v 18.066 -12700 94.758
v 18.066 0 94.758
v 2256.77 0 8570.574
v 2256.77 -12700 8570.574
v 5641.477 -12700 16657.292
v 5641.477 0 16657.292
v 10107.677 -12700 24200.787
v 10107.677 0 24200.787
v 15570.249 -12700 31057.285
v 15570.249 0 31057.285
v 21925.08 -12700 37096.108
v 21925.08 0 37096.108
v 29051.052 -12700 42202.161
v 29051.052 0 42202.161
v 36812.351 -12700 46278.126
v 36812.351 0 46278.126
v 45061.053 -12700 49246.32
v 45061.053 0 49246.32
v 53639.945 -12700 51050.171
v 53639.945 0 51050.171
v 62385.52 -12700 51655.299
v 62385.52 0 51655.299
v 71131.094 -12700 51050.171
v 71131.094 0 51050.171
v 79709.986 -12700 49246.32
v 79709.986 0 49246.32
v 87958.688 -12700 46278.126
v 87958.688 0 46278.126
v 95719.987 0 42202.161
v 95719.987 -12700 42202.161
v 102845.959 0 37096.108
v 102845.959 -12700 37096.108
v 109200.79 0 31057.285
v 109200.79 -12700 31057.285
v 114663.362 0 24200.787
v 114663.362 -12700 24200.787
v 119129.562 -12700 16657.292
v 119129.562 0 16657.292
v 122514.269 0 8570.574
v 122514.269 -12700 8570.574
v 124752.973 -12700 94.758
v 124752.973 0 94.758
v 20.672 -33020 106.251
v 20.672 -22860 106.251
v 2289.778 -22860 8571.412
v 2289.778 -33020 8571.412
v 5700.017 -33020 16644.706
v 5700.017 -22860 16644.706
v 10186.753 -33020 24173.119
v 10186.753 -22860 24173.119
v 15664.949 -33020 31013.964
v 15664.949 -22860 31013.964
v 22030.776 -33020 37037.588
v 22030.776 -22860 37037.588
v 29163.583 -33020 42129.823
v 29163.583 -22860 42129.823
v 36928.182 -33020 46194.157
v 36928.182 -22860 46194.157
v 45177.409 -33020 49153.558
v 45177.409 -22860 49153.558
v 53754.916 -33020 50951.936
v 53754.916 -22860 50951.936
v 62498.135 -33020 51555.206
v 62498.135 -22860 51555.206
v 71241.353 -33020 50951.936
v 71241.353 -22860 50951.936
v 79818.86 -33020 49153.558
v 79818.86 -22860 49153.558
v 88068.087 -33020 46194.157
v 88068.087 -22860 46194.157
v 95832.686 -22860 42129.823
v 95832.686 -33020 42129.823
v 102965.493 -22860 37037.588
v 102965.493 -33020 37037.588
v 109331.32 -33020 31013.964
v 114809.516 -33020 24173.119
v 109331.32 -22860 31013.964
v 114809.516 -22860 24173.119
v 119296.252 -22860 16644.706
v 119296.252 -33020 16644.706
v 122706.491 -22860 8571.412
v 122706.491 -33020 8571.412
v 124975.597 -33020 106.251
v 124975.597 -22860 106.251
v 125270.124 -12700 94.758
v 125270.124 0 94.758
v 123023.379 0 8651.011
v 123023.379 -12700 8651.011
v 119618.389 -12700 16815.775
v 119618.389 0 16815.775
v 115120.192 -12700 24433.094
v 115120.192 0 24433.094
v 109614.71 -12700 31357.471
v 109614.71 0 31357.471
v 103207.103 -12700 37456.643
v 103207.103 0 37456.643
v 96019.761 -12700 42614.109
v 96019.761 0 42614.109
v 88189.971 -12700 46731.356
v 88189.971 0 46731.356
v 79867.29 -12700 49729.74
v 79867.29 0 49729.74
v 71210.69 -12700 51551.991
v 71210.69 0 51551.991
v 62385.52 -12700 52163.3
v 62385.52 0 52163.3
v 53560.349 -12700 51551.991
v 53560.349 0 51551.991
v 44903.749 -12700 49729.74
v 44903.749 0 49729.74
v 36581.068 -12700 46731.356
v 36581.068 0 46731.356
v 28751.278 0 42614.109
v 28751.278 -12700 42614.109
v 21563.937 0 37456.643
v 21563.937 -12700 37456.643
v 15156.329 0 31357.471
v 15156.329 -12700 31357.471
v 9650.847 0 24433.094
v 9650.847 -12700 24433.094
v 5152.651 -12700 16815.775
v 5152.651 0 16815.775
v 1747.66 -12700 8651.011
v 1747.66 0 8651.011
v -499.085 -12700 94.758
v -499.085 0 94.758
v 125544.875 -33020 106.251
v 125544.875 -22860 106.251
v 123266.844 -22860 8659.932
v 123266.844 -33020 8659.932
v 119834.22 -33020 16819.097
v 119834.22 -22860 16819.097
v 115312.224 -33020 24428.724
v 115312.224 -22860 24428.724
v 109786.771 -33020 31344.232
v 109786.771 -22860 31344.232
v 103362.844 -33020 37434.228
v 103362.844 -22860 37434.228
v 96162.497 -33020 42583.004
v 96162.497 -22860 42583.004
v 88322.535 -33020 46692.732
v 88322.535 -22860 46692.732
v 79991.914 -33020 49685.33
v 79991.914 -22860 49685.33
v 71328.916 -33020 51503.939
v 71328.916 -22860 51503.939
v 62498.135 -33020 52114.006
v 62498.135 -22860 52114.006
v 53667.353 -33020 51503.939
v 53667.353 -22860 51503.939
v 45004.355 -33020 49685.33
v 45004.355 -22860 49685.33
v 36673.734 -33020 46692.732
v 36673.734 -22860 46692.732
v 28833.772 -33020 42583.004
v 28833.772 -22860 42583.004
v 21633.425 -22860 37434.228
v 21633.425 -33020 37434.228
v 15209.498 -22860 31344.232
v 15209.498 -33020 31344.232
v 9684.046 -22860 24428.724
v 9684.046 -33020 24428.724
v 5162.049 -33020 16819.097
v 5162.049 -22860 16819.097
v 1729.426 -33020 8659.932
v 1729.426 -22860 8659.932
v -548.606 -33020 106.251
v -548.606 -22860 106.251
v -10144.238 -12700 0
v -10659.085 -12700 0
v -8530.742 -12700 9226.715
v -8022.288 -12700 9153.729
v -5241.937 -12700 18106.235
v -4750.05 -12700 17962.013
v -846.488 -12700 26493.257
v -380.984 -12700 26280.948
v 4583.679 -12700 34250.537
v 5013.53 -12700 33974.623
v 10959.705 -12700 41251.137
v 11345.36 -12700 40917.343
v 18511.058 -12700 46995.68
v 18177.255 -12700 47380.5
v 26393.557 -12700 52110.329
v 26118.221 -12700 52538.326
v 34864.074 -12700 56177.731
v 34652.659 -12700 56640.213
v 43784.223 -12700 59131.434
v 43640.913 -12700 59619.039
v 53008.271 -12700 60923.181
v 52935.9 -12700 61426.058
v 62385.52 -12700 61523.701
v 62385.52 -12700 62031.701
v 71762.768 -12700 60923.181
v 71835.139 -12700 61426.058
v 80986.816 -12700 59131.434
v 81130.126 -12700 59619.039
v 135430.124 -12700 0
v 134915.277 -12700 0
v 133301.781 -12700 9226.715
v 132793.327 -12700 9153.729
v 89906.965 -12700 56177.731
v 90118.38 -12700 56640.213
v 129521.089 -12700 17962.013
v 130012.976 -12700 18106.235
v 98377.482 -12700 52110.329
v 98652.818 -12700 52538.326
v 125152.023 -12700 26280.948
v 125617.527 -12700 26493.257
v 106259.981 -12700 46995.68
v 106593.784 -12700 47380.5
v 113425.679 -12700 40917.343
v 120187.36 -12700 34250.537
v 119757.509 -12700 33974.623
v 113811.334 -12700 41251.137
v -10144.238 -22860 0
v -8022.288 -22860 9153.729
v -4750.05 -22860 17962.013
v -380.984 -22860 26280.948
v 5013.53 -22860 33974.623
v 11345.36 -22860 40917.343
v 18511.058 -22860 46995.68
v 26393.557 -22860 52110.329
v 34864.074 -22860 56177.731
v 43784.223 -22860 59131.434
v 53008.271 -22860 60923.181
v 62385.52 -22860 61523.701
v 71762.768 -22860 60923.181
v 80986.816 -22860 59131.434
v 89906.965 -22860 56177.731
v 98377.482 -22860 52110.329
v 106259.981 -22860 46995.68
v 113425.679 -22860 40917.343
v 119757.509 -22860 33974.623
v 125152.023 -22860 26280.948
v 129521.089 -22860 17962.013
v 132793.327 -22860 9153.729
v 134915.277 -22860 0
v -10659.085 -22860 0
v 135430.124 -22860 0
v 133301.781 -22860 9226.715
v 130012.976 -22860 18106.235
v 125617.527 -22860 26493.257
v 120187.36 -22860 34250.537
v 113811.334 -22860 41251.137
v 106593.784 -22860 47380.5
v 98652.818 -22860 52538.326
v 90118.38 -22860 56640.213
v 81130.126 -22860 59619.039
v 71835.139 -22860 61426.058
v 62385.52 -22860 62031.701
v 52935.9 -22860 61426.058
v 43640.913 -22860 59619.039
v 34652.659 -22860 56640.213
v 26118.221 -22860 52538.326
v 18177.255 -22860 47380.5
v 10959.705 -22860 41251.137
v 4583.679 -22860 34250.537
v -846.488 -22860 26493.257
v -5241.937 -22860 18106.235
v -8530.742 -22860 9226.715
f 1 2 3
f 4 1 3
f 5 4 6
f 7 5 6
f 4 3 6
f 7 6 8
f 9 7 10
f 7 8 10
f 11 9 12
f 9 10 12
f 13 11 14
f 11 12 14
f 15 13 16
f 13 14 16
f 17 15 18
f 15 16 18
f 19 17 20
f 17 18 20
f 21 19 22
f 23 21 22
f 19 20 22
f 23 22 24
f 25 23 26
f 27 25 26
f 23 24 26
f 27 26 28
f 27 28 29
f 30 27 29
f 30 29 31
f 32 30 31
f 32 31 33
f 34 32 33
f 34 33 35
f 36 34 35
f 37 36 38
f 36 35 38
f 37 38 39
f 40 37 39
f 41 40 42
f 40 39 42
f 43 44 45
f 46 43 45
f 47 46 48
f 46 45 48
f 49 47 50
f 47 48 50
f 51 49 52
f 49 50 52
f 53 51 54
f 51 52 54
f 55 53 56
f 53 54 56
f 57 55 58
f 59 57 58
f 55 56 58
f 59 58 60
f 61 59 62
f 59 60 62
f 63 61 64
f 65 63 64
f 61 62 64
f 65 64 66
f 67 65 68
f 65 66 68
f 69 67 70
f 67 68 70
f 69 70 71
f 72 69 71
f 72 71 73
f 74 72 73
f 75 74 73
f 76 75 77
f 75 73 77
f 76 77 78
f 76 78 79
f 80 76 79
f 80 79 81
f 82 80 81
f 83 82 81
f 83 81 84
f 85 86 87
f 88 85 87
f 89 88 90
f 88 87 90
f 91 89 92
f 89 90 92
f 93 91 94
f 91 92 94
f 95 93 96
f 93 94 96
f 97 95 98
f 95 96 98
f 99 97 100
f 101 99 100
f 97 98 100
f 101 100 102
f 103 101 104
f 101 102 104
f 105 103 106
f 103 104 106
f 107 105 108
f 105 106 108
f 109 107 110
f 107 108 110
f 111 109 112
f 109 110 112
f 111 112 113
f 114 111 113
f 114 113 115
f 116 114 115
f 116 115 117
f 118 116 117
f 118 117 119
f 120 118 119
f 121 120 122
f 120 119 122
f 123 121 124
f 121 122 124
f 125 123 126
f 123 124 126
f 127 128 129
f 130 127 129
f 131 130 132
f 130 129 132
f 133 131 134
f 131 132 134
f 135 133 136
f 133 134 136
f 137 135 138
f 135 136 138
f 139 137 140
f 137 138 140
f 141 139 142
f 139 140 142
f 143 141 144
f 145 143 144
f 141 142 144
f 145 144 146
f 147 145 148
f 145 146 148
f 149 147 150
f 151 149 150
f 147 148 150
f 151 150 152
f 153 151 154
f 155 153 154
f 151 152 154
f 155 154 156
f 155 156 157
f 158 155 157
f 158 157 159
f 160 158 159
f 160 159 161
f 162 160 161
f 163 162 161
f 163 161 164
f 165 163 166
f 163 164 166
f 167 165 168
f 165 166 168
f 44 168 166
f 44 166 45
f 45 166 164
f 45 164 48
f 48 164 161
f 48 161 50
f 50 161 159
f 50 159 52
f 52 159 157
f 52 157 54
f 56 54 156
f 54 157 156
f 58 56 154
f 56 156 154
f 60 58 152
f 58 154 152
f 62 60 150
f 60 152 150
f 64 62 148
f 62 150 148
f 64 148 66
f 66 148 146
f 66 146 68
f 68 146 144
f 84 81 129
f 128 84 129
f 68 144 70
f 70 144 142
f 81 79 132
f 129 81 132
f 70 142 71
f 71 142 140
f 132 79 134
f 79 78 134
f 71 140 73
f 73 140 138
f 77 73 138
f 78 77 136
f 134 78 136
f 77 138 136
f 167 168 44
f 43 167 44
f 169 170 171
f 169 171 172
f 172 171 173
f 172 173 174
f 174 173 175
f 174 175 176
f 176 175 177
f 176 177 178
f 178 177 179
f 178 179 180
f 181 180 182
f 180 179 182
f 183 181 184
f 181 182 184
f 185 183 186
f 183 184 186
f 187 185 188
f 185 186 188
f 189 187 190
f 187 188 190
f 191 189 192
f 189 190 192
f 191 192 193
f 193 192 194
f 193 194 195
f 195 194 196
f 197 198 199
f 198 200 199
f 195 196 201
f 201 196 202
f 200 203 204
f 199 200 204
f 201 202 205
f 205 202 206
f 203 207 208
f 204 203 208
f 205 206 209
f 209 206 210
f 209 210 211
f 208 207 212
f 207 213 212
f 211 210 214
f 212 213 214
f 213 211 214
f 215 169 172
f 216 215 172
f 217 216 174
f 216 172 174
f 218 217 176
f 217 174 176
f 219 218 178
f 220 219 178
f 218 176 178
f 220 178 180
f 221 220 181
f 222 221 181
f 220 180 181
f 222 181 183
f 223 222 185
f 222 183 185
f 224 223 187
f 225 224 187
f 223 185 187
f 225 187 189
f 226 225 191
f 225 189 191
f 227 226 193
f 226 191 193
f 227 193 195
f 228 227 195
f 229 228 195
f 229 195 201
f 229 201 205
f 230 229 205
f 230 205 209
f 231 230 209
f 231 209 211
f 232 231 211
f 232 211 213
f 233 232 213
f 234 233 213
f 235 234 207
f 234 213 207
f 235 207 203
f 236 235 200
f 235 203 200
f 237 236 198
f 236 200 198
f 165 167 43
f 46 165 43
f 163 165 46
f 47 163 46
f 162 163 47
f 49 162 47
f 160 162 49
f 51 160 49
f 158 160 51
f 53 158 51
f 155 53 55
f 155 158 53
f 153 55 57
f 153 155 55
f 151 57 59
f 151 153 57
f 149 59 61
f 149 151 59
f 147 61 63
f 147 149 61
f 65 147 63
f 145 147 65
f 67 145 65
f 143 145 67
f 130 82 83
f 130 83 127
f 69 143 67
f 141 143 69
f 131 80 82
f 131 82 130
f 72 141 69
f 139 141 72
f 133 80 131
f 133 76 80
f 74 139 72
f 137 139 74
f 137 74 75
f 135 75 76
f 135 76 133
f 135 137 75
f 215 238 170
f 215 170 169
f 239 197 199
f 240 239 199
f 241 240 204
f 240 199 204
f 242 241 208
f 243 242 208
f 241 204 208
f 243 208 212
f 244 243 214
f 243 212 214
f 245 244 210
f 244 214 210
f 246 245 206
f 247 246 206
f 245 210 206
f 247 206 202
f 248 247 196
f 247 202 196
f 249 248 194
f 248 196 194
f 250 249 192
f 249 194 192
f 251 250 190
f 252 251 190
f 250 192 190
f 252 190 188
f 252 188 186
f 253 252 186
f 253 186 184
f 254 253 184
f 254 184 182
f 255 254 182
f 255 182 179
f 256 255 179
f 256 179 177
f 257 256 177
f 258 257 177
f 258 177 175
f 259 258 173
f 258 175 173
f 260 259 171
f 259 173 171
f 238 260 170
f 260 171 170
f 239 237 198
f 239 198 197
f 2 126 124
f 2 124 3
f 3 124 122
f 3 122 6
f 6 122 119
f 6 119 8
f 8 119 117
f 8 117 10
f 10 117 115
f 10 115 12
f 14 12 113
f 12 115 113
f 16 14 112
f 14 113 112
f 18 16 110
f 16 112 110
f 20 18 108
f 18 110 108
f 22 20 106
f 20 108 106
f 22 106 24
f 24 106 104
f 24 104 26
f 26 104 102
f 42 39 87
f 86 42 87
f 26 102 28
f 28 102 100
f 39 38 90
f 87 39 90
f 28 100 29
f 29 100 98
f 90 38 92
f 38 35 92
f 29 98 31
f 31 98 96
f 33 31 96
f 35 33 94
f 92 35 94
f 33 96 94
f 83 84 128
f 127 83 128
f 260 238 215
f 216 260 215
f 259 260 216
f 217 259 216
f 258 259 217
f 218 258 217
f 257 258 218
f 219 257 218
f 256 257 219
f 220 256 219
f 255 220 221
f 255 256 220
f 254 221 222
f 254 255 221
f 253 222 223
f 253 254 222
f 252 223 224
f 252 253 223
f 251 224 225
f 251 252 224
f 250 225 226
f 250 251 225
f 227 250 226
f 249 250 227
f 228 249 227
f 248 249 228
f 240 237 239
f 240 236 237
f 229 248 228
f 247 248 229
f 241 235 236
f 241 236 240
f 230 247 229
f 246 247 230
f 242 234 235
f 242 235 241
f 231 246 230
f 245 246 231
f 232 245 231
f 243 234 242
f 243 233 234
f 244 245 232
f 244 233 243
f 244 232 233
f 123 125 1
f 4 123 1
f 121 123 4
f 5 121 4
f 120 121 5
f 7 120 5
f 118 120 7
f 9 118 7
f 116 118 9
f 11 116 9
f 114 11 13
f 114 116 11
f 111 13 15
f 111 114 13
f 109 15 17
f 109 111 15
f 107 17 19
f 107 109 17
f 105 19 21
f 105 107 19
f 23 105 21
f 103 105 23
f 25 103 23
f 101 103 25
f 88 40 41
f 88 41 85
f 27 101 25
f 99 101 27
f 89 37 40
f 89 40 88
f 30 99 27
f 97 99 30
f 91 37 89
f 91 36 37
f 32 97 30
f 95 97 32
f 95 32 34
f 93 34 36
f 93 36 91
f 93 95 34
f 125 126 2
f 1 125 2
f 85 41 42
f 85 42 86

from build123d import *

# Parameters (mm, degrees)
F1_DEPTH = 12700
F3_DEPTH = 10160
F5_DEPTH = 10160


# Not quite as in the source:
# - the program builds the solid bodies; features that only make, move or delete a surface that nothing else refers to are left out


with BuildPart() as f1:
    # F0 (on Front) → F1 (new body)
    with BuildSketch(Plane.XZ):
        with BuildLine():
            ThreePointArc((18.0655783815, 94.7577951073), (62385.5195391376, 51655.2985756552), (124752.9734998938, 94.7577951073))
            Line((124752.9734998938, 94.7577951073), (125270.1242021943, 94.7577951073))
            ThreePointArc((125270.1242021943, 94.7577951073), (62385.5195391376, 52163.2995605469), (-499.0851239191, 94.7577951073))
            Line((-499.085123919, 94.7577951073), (18.0655783815, 94.7577951073))
        make_face()
    extrude(amount=F1_DEPTH)


with BuildPart() as f3:
    # F2 (on face) → F3 (new body)
    with BuildSketch(Plane.XZ.offset(12700)):
        with BuildLine():
            Line((134915.2767422943, 0), (135430.1242021946, 0))
            ThreePointArc((135430.1242021946, 0), (62385.5195391377, 62031.7013759603), (-10659.0851239193, 0))
            Line((-10659.0851239193, 0), (-10144.237664019, 0))
            ThreePointArc((-10144.2376640191, 0), (62385.5195391376, 61523.7007141114), (134915.2767422944, 0))
        make_face()
    extrude(amount=F3_DEPTH)


with BuildPart() as f5:
    # F4 (on face) → F5 (new body)
    with BuildSketch(Plane.XZ.offset(22860)):
        with BuildLine():
            ThreePointArc((20.6717815327, 106.2507860158), (62498.1346130371, 51555.2062289571), (124975.5974445415, 106.2507860157))
            Line((124975.5974445415, 106.2507860157), (125544.8747328501, 106.2507860157))
            ThreePointArc((125544.8747328501, 106.2507860157), (62498.1346130371, 52114.0060424805), (-548.6055067759, 106.2507860157))
            Line((-548.6055067759, 106.2507860157), (20.6717815327, 106.2507860157))
        make_face()
    extrude(amount=F5_DEPTH)


solid = Compound([f1.part, f3.part, f5.part])
